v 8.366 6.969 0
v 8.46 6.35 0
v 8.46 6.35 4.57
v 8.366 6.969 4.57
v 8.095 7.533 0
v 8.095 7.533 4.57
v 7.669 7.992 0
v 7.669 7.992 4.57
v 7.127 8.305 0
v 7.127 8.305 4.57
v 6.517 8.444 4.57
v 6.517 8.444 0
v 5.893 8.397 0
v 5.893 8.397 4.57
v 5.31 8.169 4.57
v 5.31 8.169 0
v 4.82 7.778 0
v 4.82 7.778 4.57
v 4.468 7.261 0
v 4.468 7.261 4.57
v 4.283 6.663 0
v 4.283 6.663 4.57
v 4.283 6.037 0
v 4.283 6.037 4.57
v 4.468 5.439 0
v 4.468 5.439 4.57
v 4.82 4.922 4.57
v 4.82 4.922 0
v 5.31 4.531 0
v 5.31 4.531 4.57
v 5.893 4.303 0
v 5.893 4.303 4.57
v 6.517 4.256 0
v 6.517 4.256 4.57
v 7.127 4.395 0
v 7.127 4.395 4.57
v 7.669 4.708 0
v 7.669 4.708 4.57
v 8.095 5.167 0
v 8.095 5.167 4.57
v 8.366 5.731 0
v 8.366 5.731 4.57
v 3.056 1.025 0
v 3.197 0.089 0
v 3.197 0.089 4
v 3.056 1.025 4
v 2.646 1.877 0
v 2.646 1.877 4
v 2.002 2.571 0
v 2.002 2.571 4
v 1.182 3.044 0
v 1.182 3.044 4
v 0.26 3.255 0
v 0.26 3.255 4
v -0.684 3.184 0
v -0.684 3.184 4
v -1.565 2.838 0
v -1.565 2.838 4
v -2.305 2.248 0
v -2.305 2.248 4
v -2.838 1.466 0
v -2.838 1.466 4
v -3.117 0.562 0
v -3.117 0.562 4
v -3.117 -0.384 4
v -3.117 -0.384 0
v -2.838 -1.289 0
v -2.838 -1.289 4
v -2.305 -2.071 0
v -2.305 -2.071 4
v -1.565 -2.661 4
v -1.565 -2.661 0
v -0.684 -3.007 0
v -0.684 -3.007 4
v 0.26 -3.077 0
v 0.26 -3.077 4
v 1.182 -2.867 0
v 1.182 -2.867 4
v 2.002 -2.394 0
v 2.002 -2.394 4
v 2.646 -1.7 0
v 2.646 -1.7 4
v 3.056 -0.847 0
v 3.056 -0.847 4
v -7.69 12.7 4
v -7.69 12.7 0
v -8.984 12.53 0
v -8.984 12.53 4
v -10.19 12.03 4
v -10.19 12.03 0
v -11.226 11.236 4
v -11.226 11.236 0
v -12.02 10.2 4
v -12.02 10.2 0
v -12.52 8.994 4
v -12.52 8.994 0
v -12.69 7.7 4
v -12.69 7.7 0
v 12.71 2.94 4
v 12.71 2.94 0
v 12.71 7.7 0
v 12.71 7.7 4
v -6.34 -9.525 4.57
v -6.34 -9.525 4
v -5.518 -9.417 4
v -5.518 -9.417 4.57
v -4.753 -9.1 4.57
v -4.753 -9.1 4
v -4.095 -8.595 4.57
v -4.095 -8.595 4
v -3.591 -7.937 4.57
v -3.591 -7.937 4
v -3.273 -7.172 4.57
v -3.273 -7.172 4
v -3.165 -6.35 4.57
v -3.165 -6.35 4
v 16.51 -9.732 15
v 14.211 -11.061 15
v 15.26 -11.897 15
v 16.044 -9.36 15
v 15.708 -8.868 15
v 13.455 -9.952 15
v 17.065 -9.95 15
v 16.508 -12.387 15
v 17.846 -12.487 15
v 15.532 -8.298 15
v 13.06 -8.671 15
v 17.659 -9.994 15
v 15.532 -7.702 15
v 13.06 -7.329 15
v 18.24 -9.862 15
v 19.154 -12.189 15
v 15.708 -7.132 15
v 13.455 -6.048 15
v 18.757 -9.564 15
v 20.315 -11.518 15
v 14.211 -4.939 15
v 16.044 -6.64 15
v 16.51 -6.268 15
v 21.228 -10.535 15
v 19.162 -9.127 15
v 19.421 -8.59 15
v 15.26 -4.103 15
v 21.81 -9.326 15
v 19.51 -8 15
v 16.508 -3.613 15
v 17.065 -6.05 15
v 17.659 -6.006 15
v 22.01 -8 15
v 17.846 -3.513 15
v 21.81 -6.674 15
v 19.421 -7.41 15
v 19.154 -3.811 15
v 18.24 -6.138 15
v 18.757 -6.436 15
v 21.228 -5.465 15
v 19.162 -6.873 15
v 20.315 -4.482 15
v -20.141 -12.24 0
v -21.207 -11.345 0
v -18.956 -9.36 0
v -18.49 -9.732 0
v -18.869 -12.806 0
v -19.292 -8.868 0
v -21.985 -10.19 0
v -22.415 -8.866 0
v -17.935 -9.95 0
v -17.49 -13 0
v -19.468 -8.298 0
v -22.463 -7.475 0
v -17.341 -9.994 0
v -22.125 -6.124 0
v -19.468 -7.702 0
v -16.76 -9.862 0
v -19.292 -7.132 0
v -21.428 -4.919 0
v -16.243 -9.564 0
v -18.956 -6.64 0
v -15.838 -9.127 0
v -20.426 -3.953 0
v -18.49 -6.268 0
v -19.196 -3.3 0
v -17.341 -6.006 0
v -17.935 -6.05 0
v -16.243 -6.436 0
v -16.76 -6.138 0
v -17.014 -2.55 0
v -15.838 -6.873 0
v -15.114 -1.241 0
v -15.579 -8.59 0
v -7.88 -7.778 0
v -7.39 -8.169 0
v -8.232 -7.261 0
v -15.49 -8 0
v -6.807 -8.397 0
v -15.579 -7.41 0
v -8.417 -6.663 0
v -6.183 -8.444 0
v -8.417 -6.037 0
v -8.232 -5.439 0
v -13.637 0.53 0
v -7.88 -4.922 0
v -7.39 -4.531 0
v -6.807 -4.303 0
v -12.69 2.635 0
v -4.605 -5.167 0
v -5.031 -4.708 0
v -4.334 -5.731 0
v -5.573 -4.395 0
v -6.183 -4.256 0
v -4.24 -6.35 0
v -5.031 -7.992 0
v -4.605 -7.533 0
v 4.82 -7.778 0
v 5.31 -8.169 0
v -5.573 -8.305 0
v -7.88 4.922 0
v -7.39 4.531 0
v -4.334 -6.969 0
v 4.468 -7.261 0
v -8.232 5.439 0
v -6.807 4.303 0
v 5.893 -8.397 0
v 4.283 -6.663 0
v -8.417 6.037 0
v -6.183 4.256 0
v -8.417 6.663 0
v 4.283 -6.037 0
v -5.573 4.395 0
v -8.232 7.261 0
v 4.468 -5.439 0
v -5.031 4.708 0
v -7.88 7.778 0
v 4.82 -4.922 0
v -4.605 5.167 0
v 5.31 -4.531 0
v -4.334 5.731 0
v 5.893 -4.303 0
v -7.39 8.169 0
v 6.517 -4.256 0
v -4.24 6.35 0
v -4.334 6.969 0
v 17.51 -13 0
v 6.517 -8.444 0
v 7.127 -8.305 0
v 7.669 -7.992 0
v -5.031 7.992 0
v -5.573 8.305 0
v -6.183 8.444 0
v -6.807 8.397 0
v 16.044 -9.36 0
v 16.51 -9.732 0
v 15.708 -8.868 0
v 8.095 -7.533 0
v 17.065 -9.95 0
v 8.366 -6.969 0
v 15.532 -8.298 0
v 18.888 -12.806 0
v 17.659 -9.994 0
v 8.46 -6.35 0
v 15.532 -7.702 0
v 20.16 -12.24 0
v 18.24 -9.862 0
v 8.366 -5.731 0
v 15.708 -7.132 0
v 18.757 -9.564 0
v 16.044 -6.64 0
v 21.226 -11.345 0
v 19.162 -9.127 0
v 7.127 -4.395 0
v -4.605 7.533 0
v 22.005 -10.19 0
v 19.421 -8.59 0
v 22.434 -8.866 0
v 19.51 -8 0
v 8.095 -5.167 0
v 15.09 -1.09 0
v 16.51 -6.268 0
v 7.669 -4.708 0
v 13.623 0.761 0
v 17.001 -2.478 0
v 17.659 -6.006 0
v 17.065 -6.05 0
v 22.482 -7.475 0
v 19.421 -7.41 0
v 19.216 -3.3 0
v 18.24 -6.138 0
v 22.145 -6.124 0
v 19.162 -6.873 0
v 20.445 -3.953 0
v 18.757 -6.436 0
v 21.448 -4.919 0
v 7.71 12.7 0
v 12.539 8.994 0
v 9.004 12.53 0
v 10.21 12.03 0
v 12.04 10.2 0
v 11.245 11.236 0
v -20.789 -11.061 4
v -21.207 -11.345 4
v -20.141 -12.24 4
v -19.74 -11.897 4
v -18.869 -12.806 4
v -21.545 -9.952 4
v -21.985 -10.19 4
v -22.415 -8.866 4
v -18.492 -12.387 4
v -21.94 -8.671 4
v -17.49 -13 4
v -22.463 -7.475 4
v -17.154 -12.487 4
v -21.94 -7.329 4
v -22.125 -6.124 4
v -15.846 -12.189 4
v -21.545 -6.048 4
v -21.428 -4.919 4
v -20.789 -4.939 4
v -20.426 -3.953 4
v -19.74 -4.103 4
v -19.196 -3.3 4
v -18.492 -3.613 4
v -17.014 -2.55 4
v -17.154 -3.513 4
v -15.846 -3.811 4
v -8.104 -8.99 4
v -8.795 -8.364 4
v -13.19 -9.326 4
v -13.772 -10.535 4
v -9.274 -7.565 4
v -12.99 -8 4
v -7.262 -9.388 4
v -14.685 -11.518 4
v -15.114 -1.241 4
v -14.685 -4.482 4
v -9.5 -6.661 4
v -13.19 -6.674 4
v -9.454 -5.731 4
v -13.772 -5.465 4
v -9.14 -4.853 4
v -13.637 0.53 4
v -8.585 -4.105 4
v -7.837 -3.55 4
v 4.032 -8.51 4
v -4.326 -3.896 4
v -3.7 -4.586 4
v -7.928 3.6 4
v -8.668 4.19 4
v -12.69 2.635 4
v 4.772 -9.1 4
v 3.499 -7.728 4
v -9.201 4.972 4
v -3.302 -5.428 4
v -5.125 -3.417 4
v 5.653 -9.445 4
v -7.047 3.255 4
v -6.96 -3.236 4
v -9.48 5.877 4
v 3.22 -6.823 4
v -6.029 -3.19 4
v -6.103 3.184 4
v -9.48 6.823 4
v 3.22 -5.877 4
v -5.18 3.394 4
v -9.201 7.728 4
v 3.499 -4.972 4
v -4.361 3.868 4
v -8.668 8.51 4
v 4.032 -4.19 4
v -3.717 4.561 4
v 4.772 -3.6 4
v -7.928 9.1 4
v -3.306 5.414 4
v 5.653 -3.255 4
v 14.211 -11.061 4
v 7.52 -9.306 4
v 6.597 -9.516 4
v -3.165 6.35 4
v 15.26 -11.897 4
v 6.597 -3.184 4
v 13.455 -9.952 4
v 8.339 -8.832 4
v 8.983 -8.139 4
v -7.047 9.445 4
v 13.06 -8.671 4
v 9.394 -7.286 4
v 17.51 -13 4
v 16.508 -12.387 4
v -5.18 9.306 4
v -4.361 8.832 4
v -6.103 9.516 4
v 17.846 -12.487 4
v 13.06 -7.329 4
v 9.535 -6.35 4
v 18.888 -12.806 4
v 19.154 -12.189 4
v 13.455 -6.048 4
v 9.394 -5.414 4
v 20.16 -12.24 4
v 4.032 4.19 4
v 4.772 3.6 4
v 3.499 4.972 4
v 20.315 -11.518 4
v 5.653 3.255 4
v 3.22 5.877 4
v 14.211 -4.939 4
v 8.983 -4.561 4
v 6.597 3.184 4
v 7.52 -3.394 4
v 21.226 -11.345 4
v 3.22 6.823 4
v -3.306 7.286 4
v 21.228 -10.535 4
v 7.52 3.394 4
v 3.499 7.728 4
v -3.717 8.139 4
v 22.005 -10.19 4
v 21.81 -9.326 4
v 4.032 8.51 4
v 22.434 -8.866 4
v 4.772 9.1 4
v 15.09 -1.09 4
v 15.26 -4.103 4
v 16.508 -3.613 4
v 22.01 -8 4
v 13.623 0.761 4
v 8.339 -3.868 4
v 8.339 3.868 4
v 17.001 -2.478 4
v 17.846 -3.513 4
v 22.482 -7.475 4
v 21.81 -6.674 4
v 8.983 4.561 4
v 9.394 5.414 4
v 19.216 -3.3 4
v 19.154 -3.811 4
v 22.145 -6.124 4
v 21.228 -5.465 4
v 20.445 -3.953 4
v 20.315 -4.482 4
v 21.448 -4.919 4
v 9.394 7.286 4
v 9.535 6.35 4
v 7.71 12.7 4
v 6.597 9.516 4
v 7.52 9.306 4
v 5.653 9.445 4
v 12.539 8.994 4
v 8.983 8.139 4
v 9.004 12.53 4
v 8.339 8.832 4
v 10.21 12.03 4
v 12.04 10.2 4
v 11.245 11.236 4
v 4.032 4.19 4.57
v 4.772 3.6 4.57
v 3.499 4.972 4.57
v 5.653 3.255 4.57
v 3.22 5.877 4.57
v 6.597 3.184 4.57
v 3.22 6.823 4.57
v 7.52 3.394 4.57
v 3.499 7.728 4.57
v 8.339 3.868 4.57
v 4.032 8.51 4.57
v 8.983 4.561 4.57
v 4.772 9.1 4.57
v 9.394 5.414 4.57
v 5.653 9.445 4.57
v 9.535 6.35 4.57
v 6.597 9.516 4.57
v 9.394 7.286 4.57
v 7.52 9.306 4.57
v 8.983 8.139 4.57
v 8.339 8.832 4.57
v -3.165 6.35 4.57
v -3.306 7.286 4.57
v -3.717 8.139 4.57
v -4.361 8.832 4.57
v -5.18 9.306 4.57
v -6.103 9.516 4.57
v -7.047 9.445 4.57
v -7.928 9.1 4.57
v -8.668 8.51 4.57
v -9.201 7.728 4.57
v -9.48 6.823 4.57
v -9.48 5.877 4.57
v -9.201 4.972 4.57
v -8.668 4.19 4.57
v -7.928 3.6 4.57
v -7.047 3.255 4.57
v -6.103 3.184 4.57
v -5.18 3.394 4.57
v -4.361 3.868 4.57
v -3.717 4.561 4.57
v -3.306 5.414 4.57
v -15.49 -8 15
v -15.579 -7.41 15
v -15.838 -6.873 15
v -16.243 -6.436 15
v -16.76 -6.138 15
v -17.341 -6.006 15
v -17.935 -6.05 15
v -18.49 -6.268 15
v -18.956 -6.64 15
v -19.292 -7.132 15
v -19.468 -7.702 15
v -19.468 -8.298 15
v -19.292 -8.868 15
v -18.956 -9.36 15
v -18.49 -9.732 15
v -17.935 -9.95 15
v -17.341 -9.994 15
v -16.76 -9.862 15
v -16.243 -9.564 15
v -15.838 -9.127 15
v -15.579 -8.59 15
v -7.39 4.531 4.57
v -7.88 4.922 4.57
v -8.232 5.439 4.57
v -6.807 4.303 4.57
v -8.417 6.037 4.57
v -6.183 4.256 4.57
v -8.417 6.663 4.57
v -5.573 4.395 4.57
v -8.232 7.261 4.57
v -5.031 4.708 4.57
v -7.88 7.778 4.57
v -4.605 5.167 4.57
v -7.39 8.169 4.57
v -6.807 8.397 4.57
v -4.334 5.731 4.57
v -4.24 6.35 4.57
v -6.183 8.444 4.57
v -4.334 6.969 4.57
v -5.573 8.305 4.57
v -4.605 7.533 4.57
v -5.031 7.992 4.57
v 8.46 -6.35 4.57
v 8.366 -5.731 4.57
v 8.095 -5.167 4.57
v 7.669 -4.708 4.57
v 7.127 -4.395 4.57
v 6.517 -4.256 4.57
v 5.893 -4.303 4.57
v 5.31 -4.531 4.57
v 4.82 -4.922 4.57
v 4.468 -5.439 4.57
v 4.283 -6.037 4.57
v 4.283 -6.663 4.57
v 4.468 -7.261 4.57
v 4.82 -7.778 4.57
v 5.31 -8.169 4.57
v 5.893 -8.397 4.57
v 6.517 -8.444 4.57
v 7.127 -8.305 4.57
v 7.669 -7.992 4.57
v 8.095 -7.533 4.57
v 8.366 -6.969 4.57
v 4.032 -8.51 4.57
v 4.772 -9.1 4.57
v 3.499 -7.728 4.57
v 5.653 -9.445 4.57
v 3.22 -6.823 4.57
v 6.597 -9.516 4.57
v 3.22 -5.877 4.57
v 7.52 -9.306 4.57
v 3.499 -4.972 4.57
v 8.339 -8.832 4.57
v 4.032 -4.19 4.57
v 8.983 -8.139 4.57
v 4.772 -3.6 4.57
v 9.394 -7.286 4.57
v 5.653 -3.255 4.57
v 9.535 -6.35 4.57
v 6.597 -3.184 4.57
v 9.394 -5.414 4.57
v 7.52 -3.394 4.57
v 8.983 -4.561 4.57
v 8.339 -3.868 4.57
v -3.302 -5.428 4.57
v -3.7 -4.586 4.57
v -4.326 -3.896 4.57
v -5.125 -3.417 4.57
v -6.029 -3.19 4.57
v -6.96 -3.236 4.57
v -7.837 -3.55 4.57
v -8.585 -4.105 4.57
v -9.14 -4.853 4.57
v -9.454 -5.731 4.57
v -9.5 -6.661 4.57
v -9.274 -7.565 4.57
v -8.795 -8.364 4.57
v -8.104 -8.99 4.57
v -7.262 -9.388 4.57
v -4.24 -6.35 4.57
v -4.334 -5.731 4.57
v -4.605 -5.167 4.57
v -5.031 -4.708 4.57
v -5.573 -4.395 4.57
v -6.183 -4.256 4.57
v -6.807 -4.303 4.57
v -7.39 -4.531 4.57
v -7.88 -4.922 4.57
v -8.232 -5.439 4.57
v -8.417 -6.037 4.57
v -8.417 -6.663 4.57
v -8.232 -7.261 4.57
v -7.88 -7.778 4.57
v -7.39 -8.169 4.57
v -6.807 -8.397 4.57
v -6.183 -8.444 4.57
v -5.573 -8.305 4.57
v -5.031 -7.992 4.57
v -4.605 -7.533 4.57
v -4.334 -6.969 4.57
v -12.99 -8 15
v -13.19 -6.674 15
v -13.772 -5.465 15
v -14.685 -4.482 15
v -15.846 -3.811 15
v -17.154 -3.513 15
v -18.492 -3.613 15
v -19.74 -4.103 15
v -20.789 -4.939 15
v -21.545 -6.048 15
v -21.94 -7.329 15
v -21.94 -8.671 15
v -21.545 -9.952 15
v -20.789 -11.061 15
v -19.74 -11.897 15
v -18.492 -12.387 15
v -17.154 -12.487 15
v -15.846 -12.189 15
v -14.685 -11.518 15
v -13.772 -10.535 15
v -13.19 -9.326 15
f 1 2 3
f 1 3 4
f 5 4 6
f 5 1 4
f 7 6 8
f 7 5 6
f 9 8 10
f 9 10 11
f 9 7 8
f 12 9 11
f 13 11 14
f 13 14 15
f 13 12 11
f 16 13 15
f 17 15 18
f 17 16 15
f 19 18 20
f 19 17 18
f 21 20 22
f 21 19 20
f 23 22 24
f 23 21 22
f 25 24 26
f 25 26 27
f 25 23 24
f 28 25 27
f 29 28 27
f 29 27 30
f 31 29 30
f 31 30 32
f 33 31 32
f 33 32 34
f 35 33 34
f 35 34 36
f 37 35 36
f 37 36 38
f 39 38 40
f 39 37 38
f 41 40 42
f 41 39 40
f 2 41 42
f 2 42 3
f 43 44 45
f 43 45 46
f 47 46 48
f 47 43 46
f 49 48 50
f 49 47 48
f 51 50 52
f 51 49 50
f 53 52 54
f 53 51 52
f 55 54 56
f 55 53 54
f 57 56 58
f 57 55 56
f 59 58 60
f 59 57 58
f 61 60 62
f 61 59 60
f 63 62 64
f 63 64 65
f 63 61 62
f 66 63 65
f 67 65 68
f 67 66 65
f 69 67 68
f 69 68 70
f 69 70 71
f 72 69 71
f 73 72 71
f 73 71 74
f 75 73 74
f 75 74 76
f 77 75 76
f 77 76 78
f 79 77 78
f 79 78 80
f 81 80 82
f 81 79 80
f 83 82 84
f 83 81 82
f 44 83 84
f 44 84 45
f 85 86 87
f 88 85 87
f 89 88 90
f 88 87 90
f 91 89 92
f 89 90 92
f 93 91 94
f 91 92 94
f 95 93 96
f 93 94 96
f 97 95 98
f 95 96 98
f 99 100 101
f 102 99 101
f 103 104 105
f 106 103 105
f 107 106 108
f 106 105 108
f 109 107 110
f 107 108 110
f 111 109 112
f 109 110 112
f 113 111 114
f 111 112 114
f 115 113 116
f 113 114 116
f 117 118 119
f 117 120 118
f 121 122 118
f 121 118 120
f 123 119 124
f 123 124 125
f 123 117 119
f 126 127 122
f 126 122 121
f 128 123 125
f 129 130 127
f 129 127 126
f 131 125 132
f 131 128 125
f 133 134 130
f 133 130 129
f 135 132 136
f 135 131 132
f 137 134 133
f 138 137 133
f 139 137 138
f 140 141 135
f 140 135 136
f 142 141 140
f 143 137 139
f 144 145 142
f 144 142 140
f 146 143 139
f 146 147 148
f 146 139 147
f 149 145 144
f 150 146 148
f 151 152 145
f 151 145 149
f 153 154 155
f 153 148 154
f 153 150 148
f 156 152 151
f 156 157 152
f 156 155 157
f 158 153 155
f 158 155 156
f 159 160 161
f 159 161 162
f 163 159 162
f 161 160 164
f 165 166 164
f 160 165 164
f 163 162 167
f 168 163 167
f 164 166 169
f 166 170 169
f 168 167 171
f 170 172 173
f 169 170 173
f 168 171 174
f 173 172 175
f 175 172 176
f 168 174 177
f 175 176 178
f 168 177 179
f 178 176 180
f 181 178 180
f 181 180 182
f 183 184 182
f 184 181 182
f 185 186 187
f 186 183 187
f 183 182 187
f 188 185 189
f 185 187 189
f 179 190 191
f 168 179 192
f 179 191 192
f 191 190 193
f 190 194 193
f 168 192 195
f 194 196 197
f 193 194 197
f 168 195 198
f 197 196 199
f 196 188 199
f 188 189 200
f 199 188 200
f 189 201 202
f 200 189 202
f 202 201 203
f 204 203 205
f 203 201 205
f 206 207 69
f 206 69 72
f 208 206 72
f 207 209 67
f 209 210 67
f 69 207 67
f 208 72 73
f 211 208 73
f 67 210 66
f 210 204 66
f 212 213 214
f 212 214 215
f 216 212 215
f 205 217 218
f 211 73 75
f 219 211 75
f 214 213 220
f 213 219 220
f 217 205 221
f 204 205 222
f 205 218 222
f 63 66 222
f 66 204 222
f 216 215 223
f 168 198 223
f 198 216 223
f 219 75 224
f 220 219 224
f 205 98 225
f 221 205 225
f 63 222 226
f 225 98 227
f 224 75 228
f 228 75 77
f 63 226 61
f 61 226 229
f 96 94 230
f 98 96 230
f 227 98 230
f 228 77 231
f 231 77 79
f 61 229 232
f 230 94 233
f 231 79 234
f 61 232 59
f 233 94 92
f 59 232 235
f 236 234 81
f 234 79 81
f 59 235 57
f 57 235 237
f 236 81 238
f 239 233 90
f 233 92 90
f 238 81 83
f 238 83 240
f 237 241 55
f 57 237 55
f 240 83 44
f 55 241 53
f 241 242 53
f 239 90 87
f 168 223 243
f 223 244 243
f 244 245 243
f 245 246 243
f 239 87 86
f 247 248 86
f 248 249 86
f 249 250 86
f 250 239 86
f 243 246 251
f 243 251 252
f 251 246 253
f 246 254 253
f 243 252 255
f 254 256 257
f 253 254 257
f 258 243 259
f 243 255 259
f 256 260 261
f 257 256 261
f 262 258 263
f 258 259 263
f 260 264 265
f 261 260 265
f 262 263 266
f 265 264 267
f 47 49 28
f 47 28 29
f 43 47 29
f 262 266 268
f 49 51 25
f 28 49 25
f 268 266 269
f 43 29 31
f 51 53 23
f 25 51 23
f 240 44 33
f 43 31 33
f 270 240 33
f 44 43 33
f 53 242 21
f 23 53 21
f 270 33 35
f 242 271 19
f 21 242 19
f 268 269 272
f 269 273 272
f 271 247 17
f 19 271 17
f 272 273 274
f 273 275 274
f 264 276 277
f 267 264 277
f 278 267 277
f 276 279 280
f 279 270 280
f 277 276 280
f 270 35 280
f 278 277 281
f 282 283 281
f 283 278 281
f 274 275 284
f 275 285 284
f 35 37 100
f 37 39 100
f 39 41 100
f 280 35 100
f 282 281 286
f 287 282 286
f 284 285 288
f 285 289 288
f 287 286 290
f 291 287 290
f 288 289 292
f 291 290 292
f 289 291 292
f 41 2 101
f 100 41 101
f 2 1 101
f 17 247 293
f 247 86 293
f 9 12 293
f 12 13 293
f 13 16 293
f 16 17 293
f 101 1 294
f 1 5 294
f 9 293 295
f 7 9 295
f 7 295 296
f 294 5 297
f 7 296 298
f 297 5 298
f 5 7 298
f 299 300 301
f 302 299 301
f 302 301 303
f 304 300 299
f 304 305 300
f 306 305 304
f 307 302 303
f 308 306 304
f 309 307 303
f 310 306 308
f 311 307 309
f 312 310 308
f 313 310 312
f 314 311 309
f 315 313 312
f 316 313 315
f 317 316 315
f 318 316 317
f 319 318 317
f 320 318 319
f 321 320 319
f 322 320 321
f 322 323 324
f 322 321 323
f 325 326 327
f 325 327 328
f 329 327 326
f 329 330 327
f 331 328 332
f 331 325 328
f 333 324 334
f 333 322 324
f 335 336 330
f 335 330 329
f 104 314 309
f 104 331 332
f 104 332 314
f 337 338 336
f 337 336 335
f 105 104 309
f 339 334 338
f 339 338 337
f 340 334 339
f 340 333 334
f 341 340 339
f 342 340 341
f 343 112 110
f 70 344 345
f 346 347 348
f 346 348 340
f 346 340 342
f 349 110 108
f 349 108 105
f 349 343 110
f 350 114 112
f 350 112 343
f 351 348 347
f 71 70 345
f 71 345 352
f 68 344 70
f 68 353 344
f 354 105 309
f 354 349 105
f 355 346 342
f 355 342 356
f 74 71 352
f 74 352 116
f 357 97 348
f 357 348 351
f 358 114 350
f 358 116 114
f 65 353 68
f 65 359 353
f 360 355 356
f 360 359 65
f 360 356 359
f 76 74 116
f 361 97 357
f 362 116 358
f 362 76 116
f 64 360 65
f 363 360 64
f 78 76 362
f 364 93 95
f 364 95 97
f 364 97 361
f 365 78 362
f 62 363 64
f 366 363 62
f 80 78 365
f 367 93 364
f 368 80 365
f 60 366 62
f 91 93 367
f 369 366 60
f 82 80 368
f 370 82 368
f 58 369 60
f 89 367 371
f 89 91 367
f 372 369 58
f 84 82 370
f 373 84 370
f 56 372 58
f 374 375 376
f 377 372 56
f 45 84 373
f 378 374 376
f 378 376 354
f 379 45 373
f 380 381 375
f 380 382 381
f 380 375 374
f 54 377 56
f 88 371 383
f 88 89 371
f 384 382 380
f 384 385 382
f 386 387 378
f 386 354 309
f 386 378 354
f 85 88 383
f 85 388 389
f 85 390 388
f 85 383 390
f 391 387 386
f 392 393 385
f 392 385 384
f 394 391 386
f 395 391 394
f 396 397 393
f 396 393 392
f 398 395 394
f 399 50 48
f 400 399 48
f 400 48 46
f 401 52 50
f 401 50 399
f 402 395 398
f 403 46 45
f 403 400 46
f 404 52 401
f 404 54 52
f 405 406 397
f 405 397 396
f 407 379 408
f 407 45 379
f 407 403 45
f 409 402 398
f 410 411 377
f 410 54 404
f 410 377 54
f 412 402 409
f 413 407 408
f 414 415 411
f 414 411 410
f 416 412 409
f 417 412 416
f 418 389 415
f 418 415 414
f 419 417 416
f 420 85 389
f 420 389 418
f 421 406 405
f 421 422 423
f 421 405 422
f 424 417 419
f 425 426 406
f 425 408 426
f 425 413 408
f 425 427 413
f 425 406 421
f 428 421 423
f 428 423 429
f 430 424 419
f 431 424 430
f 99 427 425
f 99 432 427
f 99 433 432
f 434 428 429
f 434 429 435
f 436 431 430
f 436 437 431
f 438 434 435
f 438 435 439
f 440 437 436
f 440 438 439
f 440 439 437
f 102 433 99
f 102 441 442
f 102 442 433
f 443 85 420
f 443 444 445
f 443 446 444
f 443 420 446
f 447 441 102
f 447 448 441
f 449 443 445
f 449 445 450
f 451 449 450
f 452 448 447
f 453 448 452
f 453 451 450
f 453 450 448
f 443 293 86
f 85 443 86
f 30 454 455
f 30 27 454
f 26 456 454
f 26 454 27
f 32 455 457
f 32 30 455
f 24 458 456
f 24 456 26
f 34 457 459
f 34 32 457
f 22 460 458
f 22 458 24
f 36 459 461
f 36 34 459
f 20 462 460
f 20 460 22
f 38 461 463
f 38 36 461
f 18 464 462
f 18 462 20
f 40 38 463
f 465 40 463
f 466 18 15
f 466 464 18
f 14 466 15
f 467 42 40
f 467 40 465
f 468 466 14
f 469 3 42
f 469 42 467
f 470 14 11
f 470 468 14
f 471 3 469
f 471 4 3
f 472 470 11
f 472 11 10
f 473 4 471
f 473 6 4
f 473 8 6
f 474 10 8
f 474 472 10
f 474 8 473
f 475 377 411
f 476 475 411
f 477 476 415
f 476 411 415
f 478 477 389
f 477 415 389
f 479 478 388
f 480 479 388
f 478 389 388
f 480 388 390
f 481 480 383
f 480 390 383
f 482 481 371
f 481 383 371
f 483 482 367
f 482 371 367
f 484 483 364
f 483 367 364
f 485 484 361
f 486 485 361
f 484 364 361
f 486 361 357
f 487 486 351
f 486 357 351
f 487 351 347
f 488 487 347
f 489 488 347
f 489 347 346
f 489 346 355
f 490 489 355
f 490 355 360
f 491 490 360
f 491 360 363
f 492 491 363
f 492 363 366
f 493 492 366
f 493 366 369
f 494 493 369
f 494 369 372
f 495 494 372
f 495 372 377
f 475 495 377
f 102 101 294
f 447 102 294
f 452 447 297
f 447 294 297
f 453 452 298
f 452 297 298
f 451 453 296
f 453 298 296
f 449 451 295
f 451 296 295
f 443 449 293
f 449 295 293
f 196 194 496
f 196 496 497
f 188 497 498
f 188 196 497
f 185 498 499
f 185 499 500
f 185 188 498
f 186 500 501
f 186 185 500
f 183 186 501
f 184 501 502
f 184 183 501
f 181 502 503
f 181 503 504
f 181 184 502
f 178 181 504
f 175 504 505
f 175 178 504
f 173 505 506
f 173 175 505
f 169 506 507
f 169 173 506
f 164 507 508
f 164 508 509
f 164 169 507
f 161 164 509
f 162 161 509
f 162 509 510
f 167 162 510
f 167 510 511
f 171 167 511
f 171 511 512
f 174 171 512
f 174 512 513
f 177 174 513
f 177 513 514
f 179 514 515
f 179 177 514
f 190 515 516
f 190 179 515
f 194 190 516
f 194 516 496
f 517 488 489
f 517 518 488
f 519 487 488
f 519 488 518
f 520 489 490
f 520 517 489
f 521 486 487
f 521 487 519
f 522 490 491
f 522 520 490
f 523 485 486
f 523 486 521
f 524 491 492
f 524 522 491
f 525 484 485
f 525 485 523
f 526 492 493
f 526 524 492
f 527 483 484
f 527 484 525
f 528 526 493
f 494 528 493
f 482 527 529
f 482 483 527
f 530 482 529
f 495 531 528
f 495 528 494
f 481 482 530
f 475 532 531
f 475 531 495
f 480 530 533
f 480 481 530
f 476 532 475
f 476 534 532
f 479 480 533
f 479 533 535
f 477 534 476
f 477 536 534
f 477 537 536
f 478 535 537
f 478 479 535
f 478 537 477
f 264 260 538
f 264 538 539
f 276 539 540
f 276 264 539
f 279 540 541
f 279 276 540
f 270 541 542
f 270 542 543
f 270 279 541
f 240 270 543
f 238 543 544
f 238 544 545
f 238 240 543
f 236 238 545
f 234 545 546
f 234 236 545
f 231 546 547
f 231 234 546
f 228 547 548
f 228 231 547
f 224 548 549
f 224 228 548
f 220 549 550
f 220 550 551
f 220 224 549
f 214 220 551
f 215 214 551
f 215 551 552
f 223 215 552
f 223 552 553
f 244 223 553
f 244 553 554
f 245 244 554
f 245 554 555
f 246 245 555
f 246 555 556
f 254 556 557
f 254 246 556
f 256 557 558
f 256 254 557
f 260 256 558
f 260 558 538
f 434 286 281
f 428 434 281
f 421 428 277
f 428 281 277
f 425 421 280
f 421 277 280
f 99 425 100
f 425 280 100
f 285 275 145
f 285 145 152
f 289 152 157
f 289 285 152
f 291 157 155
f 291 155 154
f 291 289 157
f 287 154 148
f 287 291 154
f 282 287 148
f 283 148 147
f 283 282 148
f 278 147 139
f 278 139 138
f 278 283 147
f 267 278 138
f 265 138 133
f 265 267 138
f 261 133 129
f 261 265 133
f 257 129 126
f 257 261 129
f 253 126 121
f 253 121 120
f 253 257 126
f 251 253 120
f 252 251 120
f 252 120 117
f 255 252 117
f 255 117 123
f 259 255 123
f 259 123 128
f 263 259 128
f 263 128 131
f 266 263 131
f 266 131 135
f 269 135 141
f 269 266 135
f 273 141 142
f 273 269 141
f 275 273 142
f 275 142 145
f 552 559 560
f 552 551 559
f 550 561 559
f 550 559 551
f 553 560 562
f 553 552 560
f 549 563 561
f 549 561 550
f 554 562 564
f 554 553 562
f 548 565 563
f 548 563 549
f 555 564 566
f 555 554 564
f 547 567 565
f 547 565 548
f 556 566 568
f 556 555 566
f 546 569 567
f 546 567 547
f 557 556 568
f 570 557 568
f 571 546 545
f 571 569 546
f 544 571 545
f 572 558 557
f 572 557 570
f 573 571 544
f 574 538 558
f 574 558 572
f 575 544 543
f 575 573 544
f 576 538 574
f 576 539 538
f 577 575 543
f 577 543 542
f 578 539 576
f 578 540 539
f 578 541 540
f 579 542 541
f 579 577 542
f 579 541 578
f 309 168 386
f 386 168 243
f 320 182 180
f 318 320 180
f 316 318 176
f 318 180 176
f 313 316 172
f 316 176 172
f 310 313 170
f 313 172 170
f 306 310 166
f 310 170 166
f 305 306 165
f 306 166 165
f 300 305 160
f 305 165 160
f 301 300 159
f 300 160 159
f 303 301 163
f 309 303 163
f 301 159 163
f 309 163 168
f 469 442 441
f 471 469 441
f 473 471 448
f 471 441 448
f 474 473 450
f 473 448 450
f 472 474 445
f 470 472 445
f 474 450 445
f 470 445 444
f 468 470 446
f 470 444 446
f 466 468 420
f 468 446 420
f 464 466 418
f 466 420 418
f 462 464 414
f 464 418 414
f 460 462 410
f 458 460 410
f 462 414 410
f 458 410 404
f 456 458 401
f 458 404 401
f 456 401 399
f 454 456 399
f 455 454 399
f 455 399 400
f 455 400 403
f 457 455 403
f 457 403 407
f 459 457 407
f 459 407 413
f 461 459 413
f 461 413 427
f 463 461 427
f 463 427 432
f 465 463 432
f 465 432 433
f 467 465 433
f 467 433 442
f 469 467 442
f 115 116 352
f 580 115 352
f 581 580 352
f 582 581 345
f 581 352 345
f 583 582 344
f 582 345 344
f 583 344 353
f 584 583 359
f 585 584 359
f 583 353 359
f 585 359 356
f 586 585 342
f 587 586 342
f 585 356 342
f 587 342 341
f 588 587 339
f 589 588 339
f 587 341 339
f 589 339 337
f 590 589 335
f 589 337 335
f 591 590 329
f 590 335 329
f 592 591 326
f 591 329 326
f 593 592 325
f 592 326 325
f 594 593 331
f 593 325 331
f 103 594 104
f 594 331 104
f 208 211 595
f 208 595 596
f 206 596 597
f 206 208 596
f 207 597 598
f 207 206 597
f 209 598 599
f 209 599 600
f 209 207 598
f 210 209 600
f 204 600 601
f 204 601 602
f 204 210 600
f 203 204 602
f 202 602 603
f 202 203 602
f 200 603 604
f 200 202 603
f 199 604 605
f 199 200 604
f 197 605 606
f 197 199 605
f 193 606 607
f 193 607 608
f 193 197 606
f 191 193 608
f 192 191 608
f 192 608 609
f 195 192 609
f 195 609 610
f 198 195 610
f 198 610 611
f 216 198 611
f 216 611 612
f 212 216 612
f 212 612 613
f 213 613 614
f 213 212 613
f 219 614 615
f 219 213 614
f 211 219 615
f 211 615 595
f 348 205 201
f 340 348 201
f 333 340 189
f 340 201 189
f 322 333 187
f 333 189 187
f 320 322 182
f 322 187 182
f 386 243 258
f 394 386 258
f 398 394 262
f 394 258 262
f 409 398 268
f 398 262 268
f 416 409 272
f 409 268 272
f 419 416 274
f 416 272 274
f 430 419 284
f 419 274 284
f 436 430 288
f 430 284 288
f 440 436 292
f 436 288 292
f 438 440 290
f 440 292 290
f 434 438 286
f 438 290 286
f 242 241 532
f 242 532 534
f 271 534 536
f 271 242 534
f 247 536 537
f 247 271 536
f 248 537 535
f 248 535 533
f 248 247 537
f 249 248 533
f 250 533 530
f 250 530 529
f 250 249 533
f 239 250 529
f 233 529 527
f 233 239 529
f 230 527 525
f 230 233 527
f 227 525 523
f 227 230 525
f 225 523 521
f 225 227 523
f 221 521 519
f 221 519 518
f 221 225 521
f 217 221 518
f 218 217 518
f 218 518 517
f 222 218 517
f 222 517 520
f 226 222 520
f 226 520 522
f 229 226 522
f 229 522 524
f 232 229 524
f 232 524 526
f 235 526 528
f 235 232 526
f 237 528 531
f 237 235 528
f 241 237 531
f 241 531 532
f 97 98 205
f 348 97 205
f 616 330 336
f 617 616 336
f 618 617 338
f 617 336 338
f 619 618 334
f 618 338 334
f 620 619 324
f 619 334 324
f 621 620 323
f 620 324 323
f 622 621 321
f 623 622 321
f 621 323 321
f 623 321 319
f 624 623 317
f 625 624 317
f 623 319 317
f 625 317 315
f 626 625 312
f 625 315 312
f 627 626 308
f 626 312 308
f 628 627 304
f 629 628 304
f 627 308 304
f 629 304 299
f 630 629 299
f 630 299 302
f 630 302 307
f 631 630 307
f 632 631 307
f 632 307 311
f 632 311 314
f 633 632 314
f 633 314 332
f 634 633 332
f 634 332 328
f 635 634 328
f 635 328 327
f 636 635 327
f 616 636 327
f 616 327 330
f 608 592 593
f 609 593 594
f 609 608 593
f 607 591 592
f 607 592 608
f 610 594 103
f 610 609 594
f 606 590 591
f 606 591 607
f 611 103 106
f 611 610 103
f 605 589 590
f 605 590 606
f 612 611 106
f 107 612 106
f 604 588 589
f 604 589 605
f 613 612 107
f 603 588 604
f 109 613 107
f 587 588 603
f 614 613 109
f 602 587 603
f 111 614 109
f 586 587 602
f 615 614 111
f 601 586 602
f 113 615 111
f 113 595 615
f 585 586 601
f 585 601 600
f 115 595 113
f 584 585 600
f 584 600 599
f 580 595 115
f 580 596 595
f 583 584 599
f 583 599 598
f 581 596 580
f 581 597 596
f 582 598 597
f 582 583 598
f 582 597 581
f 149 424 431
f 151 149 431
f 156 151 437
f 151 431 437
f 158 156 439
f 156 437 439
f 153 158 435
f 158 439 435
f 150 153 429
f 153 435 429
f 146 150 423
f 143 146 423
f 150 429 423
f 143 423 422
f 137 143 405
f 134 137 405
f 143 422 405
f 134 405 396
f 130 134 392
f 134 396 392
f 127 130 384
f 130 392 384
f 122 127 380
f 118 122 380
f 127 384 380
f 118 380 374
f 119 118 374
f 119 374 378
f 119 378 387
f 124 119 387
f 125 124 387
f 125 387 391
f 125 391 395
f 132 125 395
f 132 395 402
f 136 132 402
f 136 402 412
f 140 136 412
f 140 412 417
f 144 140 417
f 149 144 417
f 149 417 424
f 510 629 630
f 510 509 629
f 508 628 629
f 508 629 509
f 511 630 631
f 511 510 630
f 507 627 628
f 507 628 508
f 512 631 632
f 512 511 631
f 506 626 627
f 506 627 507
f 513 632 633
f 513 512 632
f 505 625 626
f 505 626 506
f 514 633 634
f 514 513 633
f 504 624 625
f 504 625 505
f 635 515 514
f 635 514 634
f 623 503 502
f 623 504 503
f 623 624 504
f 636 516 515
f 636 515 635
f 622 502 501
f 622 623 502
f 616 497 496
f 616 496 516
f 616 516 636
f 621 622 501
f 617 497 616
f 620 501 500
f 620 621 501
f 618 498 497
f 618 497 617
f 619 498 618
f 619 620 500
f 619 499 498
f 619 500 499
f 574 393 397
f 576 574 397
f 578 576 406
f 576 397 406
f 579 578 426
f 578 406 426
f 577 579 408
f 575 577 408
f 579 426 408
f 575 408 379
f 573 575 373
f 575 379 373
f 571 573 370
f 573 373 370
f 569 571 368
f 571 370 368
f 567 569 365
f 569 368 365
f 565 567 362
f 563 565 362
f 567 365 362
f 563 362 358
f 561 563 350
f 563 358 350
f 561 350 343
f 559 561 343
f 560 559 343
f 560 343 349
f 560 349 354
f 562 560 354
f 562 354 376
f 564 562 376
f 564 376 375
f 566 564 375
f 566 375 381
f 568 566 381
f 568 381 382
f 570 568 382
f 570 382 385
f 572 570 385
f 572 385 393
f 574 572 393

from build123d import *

# Parameters (mm, degrees)
F1_R     = 4.5
F1_R_2   = 3.175
F2_DEPTH = 4
F1_R_3   = 2.1
F3_DEPTH = 4.57
F4_DEPTH = 4.57
F5_DEPTH = 4.57
F6_DEPTH = 4.57
F1_R_4   = 2
F7_DEPTH = 15
F8_DEPTH = 15


with BuildPart() as f2:
    # F1 (on face) → F2 (new body)
    with BuildSketch(Plane.XY):
        with BuildLine():
            Line((7.709795, 12.7), (-7.690205, 12.7))
            ThreePointArc((-7.690205, 12.7), (-11.225739, 11.235534), (-12.690205, 7.7))
            Line((-12.690205, 7.7), (-12.690205, 2.634689))
            ThreePointArc((-12.690205, 2.634689), (-15.114116, -1.24147), (-19.196077, -3.3))
            ThreePointArc((-19.196077, -3.3), (-22.414634, -8.866025), (-17.490205, -13))
            Line((-17.490205, -13), (17.509795, -13))
            ThreePointArc((17.509795, -13), (22.434224, -8.866025), (19.215667, -3.3))
            ThreePointArc((19.215667, -3.3), (15.089649, -1.090359), (12.709795, 2.939881))
            Line((12.709795, 2.939881), (12.709795, 7.7))
            ThreePointArc((12.709795, 7.7), (11.245329, 11.235534), (7.709795, 12.7))
        make_face()
        with Locations((-17.490205, -8)):
            Circle(F1_R, mode=Mode.SUBTRACT)
        with BuildLine():
            ThreePointArc((-6.340205, -9.525), (-8.585269, -4.104936), (-3.165205, -6.35))
            ThreePointArc((-3.165205, -6.35), (-4.095141, -8.595064), (-6.340205, -9.525))
        make_face(mode=Mode.SUBTRACT)
        with Locations((17.509795, -8)):
            Circle(F1_R, mode=Mode.SUBTRACT)
        with Locations((6.359795, -6.35)):
            Circle(F1_R_2, mode=Mode.SUBTRACT)
        with Locations((-6.340205, 6.35)):
            Circle(F1_R_2, mode=Mode.SUBTRACT)
        with Locations((0.022334, 0.088805)):
            Circle(F1_R_2, mode=Mode.SUBTRACT)
        with Locations((6.359795, 6.35)):
            Circle(F1_R_2, mode=Mode.SUBTRACT)
    extrude(amount=F2_DEPTH)

    # F1 (on face) → F3 (join)
    with BuildSketch(Plane.XY):
        with Locations((-6.340205, 6.35)):
            Circle(F1_R_2)
        with Locations((-6.340205, 6.35)):
            Circle(F1_R_3, mode=Mode.SUBTRACT)
    extrude(amount=F3_DEPTH)

    # F1 (on face) → F4 (join)
    with BuildSketch(Plane.XY):
        with Locations((6.359795, 6.35)):
            Circle(F1_R_2)
        with Locations((6.359795, 6.35)):
            Circle(F1_R_3, mode=Mode.SUBTRACT)
    extrude(amount=F4_DEPTH)

    # F1 (on face) → F5 (join)
    with BuildSketch(Plane.XY):
        with Locations((6.359795, -6.35)):
            Circle(F1_R_2)
        with Locations((6.359795, -6.35)):
            Circle(F1_R_3, mode=Mode.SUBTRACT)
    extrude(amount=F5_DEPTH)

    # F1 (on face) → F6 (join)
    with BuildSketch(Plane.XY):
        with BuildLine():
            ThreePointArc((-6.340205, -9.525), (-4.095141, -8.595064), (-3.165205, -6.35))
            ThreePointArc((-3.165205, -6.35), (-8.585269, -4.104936), (-6.340205, -9.525))
        make_face()
        with Locations((-6.340205, -6.35)):
            Circle(F1_R_3, mode=Mode.SUBTRACT)
    extrude(amount=F6_DEPTH)

    # F1 (on face) → F7 (join)
    with BuildSketch(Plane.XY):
        with Locations((-17.490205, -8)):
            Circle(F1_R)
        with Locations((-17.490205, -8)):
            Circle(F1_R_4, mode=Mode.SUBTRACT)
    extrude(amount=F7_DEPTH)

    # F1 (on face) → F8 (join)
    with BuildSketch(Plane.XY):
        with Locations((17.509795, -8)):
            Circle(F1_R)
        with Locations((17.509795, -8)):
            Circle(F1_R_4, mode=Mode.SUBTRACT)
    extrude(amount=F8_DEPTH)


solid = f2.part
